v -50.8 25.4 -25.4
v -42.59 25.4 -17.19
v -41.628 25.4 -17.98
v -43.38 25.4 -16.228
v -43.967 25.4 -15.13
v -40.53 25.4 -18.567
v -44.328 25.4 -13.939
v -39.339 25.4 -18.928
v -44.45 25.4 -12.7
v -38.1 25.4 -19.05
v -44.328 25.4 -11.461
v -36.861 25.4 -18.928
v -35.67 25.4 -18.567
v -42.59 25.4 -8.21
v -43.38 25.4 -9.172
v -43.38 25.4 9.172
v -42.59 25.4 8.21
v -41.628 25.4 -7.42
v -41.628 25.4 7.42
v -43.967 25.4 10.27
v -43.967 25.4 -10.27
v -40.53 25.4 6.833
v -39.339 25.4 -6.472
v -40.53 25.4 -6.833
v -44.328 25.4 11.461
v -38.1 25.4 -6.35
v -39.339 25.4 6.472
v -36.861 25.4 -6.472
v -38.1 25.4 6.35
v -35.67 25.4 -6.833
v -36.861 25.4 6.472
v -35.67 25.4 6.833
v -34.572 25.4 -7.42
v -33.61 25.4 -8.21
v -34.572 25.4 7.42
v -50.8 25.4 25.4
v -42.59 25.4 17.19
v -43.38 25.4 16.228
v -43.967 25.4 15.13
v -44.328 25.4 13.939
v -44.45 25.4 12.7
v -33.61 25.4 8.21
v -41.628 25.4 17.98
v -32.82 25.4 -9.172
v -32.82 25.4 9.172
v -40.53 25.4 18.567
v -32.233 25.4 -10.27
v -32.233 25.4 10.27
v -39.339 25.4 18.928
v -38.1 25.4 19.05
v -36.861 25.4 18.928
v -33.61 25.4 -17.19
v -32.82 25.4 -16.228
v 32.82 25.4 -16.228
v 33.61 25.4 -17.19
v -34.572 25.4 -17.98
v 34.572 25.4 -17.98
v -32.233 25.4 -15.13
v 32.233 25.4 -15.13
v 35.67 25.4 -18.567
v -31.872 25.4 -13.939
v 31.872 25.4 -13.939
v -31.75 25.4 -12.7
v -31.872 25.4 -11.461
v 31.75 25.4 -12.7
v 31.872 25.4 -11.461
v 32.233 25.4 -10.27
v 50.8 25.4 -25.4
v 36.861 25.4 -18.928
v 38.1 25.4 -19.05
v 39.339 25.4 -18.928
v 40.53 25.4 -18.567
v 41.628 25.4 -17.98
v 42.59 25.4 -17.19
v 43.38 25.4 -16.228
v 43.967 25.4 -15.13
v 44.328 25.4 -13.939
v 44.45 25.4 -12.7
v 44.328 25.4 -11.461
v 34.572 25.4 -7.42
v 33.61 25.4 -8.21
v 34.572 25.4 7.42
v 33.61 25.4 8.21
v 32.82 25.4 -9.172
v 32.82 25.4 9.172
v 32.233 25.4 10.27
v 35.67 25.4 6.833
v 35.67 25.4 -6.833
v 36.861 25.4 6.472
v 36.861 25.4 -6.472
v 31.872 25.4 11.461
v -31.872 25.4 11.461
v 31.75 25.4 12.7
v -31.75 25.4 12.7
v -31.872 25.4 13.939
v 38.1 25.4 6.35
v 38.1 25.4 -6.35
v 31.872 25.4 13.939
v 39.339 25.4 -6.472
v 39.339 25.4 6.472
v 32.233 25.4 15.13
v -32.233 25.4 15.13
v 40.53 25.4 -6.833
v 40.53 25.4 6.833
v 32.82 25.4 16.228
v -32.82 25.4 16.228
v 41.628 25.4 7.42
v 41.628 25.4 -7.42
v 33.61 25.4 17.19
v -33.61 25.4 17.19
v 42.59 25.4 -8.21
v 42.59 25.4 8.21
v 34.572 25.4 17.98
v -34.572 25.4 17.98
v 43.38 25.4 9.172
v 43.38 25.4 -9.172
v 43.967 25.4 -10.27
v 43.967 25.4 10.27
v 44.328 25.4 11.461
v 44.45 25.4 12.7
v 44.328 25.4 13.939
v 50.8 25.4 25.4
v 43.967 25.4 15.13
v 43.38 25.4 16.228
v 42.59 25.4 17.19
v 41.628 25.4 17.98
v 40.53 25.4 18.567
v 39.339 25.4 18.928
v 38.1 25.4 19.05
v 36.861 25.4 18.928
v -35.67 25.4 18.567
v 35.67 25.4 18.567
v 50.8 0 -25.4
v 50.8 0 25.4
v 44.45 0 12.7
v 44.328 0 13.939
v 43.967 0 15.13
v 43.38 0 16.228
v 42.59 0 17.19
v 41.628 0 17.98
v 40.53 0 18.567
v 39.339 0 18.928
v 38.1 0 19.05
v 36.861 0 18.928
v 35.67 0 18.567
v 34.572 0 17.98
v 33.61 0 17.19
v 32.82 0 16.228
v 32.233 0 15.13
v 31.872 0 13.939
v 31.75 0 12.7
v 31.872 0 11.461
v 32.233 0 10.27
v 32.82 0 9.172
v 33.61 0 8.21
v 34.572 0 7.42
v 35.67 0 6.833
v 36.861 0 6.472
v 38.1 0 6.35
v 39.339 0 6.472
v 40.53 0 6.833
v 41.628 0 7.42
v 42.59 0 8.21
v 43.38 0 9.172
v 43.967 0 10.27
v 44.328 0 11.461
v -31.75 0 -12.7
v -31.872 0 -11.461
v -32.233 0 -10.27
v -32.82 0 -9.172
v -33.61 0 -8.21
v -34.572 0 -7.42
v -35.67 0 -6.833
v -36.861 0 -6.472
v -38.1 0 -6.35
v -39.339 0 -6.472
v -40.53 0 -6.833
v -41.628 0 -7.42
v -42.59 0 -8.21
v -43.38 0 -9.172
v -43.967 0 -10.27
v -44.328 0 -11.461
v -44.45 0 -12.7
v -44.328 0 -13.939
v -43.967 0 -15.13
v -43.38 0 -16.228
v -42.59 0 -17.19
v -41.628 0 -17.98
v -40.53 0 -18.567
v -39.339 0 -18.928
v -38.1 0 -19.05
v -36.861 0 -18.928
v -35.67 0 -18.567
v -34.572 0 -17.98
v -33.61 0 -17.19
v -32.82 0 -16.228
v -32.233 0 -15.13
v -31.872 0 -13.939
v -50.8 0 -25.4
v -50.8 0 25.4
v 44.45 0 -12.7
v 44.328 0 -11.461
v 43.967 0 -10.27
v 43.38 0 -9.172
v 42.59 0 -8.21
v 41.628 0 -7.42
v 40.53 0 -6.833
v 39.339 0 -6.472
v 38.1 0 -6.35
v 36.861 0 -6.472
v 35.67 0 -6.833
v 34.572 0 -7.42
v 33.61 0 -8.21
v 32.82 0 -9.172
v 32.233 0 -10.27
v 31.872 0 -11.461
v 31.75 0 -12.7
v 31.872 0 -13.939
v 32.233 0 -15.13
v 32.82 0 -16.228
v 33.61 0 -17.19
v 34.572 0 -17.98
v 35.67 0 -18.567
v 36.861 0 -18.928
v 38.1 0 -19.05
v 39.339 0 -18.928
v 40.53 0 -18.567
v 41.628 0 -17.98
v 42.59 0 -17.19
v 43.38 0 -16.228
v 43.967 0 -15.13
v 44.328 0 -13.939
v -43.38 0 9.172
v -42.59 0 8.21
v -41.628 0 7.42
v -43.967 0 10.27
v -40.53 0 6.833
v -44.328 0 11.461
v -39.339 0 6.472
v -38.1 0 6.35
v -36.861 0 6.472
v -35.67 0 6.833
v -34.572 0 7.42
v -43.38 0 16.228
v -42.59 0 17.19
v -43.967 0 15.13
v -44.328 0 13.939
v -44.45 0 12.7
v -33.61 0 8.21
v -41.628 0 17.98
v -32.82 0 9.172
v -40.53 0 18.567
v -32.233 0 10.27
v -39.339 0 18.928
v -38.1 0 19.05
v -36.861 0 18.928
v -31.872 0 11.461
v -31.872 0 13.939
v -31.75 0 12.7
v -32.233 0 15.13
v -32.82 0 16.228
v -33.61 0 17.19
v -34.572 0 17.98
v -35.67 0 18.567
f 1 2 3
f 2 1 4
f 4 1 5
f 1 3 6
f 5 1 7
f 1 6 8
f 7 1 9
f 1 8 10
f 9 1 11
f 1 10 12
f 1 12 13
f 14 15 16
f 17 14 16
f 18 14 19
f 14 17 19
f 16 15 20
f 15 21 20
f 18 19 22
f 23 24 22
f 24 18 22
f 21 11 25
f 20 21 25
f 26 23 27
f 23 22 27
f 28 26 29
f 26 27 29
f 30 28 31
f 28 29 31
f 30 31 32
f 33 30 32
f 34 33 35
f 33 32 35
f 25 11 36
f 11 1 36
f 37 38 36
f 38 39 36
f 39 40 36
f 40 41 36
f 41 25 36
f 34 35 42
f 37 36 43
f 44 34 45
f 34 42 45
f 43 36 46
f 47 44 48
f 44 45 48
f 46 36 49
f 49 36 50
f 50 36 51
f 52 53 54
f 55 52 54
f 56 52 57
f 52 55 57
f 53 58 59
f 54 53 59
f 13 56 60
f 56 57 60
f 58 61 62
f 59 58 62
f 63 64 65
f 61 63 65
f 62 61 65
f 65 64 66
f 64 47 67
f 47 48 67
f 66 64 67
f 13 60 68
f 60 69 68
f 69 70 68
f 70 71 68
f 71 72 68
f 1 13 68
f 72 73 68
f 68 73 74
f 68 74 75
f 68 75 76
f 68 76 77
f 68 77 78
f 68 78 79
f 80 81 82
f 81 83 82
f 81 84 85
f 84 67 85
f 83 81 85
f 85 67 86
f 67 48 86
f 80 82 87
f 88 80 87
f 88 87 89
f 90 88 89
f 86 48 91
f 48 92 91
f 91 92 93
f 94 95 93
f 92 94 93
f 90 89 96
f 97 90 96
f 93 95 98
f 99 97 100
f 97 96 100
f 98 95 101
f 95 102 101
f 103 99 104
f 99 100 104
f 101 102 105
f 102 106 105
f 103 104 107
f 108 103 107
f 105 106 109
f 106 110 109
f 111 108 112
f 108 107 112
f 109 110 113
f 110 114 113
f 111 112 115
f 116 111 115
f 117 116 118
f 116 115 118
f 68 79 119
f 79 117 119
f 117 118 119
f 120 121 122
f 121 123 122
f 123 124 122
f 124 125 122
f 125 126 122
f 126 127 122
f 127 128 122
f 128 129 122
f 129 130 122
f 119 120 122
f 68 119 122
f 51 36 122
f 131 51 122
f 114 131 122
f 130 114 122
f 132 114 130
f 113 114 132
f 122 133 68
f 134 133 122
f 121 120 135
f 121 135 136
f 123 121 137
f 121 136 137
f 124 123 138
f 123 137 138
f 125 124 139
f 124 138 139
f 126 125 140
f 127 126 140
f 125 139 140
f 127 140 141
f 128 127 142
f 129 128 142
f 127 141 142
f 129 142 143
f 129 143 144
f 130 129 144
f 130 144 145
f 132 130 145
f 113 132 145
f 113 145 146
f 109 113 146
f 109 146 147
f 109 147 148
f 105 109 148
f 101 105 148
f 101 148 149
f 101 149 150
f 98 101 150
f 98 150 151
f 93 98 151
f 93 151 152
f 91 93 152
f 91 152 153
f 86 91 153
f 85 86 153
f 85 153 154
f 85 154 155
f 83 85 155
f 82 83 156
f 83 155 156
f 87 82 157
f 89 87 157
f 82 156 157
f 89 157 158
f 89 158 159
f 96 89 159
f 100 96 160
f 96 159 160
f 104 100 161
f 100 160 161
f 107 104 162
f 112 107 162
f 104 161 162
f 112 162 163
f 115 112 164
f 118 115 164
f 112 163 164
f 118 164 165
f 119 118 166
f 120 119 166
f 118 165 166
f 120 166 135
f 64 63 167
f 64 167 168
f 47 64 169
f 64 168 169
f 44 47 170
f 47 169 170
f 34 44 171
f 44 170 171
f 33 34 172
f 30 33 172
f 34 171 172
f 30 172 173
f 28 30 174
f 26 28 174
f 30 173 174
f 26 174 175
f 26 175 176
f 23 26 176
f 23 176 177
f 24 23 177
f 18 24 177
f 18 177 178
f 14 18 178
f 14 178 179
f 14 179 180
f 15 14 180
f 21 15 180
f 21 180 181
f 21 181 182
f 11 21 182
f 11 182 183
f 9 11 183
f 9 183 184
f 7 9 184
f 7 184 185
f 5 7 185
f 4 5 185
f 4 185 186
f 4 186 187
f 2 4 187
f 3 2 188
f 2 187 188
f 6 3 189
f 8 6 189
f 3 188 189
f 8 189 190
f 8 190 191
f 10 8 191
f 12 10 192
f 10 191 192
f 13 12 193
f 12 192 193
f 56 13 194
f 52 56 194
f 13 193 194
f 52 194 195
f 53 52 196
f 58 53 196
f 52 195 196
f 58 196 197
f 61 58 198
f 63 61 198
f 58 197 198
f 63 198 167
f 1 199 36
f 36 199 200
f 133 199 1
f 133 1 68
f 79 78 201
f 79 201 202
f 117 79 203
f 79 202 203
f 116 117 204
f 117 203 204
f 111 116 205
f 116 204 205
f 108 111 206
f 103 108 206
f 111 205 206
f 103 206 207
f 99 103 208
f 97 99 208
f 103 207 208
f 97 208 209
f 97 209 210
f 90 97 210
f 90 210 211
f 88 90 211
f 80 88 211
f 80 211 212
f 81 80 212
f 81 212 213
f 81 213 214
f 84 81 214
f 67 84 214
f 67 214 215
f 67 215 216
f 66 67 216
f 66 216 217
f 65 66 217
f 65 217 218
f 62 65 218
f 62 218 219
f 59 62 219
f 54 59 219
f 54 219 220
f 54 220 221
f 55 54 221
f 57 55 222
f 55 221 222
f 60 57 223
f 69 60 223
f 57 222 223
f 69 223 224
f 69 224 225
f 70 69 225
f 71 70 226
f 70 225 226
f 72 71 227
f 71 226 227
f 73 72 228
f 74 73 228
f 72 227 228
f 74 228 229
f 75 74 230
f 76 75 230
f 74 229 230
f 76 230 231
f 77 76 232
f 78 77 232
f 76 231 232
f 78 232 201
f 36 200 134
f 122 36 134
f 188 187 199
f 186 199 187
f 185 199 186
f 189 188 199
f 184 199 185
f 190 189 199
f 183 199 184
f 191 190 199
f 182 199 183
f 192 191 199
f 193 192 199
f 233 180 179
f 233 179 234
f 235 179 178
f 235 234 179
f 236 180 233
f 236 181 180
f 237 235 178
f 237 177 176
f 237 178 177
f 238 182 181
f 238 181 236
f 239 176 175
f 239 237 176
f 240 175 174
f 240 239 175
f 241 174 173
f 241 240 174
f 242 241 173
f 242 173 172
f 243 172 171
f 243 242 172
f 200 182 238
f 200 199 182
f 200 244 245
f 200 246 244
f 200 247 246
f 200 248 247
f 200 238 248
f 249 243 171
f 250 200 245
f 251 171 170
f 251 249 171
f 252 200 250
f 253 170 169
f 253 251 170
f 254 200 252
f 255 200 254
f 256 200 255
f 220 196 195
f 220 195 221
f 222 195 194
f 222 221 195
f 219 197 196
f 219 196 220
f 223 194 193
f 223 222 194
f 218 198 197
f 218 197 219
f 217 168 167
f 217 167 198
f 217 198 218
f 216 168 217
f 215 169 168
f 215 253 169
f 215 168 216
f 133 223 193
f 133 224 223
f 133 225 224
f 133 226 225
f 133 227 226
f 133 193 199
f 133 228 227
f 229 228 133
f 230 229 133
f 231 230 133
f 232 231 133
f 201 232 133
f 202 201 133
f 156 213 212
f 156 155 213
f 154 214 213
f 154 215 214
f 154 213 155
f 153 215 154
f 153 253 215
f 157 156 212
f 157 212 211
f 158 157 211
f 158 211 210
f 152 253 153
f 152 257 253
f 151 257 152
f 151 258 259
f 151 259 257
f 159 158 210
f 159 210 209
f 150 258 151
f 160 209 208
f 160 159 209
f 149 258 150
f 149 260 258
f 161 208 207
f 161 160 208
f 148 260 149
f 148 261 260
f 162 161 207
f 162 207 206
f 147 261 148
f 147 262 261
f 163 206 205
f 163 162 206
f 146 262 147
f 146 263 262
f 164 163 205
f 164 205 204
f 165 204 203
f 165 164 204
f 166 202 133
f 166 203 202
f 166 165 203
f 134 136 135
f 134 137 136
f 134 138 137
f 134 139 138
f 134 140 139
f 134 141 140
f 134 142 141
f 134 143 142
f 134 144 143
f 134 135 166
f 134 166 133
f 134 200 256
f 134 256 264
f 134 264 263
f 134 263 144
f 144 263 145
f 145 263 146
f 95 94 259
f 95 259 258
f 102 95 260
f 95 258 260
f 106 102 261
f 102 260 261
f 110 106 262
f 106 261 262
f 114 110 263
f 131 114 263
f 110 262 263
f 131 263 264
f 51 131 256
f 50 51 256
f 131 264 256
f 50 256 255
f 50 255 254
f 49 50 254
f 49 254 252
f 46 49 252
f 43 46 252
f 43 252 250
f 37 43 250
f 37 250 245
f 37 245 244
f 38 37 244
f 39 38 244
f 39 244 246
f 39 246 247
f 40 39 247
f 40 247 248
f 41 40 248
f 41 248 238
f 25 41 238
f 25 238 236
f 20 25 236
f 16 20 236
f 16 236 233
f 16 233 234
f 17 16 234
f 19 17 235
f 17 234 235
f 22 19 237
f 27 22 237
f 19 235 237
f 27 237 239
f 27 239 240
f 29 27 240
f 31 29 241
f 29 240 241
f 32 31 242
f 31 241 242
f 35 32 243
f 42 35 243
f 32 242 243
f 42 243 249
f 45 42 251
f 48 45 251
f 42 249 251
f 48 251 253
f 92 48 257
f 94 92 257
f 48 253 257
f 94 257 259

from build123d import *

# Parameters (mm, degrees)
F0_W     = 101.6
F0_H     = 50.8
F1_DEPTH = 25.4
F2_R     = 6.35
F3_DEPTH = 25.401
F5_W     = 7.62
F5_H     = 7.62
F6_ANGLE = 30


with BuildPart() as f1:
    # F0 (on Front) → F1 (new body)
    with BuildSketch(Plane.XZ):
        Rectangle(F0_W, F0_H)
    extrude(amount=-F1_DEPTH)

    # F2 (on face) → F3 (cut, through all)
    with BuildSketch(Plane.XZ):
        with Locations((-38.1, 12.7)):
            Circle(F2_R)
        with Locations((-38.1, -12.7)):
            Circle(F2_R)
        with Locations((38.1, 12.7)):
            Circle(F2_R)
        with Locations((38.1, -12.7)):
            Circle(F2_R)
    extrude(amount=-F3_DEPTH, mode=Mode.SUBTRACT)

    # F4 (on Top) + F5 (on Top) → F6 (revolve, cut)
    with BuildSketch(Plane.XY):
        Polygon((0, 25.4), (0, 50.8), (-12.7, 50.8), (-12.7, 25.4), (-10.645107, 25.4), (-6.35, 25.4), align=None)
    with BuildSketch(Plane.XY):
        with Locations((8.859598, 41.420042)):
            Rectangle(F5_W, F5_H)
    revolve(axis=Axis((0, 38.1, 0), (0, -1, 0)), revolution_arc=F6_ANGLE, mode=Mode.SUBTRACT)

    # F5 (on Top) → F7 (revolve, cut)
    with BuildSketch(Plane.XY):
        with Locations((8.859598, 41.420042)):
            Rectangle(F5_W, F5_H)
    revolve(axis=Axis((0, 38.1, 0), (0, -1, 0)), mode=Mode.SUBTRACT)


solid = f1.part
